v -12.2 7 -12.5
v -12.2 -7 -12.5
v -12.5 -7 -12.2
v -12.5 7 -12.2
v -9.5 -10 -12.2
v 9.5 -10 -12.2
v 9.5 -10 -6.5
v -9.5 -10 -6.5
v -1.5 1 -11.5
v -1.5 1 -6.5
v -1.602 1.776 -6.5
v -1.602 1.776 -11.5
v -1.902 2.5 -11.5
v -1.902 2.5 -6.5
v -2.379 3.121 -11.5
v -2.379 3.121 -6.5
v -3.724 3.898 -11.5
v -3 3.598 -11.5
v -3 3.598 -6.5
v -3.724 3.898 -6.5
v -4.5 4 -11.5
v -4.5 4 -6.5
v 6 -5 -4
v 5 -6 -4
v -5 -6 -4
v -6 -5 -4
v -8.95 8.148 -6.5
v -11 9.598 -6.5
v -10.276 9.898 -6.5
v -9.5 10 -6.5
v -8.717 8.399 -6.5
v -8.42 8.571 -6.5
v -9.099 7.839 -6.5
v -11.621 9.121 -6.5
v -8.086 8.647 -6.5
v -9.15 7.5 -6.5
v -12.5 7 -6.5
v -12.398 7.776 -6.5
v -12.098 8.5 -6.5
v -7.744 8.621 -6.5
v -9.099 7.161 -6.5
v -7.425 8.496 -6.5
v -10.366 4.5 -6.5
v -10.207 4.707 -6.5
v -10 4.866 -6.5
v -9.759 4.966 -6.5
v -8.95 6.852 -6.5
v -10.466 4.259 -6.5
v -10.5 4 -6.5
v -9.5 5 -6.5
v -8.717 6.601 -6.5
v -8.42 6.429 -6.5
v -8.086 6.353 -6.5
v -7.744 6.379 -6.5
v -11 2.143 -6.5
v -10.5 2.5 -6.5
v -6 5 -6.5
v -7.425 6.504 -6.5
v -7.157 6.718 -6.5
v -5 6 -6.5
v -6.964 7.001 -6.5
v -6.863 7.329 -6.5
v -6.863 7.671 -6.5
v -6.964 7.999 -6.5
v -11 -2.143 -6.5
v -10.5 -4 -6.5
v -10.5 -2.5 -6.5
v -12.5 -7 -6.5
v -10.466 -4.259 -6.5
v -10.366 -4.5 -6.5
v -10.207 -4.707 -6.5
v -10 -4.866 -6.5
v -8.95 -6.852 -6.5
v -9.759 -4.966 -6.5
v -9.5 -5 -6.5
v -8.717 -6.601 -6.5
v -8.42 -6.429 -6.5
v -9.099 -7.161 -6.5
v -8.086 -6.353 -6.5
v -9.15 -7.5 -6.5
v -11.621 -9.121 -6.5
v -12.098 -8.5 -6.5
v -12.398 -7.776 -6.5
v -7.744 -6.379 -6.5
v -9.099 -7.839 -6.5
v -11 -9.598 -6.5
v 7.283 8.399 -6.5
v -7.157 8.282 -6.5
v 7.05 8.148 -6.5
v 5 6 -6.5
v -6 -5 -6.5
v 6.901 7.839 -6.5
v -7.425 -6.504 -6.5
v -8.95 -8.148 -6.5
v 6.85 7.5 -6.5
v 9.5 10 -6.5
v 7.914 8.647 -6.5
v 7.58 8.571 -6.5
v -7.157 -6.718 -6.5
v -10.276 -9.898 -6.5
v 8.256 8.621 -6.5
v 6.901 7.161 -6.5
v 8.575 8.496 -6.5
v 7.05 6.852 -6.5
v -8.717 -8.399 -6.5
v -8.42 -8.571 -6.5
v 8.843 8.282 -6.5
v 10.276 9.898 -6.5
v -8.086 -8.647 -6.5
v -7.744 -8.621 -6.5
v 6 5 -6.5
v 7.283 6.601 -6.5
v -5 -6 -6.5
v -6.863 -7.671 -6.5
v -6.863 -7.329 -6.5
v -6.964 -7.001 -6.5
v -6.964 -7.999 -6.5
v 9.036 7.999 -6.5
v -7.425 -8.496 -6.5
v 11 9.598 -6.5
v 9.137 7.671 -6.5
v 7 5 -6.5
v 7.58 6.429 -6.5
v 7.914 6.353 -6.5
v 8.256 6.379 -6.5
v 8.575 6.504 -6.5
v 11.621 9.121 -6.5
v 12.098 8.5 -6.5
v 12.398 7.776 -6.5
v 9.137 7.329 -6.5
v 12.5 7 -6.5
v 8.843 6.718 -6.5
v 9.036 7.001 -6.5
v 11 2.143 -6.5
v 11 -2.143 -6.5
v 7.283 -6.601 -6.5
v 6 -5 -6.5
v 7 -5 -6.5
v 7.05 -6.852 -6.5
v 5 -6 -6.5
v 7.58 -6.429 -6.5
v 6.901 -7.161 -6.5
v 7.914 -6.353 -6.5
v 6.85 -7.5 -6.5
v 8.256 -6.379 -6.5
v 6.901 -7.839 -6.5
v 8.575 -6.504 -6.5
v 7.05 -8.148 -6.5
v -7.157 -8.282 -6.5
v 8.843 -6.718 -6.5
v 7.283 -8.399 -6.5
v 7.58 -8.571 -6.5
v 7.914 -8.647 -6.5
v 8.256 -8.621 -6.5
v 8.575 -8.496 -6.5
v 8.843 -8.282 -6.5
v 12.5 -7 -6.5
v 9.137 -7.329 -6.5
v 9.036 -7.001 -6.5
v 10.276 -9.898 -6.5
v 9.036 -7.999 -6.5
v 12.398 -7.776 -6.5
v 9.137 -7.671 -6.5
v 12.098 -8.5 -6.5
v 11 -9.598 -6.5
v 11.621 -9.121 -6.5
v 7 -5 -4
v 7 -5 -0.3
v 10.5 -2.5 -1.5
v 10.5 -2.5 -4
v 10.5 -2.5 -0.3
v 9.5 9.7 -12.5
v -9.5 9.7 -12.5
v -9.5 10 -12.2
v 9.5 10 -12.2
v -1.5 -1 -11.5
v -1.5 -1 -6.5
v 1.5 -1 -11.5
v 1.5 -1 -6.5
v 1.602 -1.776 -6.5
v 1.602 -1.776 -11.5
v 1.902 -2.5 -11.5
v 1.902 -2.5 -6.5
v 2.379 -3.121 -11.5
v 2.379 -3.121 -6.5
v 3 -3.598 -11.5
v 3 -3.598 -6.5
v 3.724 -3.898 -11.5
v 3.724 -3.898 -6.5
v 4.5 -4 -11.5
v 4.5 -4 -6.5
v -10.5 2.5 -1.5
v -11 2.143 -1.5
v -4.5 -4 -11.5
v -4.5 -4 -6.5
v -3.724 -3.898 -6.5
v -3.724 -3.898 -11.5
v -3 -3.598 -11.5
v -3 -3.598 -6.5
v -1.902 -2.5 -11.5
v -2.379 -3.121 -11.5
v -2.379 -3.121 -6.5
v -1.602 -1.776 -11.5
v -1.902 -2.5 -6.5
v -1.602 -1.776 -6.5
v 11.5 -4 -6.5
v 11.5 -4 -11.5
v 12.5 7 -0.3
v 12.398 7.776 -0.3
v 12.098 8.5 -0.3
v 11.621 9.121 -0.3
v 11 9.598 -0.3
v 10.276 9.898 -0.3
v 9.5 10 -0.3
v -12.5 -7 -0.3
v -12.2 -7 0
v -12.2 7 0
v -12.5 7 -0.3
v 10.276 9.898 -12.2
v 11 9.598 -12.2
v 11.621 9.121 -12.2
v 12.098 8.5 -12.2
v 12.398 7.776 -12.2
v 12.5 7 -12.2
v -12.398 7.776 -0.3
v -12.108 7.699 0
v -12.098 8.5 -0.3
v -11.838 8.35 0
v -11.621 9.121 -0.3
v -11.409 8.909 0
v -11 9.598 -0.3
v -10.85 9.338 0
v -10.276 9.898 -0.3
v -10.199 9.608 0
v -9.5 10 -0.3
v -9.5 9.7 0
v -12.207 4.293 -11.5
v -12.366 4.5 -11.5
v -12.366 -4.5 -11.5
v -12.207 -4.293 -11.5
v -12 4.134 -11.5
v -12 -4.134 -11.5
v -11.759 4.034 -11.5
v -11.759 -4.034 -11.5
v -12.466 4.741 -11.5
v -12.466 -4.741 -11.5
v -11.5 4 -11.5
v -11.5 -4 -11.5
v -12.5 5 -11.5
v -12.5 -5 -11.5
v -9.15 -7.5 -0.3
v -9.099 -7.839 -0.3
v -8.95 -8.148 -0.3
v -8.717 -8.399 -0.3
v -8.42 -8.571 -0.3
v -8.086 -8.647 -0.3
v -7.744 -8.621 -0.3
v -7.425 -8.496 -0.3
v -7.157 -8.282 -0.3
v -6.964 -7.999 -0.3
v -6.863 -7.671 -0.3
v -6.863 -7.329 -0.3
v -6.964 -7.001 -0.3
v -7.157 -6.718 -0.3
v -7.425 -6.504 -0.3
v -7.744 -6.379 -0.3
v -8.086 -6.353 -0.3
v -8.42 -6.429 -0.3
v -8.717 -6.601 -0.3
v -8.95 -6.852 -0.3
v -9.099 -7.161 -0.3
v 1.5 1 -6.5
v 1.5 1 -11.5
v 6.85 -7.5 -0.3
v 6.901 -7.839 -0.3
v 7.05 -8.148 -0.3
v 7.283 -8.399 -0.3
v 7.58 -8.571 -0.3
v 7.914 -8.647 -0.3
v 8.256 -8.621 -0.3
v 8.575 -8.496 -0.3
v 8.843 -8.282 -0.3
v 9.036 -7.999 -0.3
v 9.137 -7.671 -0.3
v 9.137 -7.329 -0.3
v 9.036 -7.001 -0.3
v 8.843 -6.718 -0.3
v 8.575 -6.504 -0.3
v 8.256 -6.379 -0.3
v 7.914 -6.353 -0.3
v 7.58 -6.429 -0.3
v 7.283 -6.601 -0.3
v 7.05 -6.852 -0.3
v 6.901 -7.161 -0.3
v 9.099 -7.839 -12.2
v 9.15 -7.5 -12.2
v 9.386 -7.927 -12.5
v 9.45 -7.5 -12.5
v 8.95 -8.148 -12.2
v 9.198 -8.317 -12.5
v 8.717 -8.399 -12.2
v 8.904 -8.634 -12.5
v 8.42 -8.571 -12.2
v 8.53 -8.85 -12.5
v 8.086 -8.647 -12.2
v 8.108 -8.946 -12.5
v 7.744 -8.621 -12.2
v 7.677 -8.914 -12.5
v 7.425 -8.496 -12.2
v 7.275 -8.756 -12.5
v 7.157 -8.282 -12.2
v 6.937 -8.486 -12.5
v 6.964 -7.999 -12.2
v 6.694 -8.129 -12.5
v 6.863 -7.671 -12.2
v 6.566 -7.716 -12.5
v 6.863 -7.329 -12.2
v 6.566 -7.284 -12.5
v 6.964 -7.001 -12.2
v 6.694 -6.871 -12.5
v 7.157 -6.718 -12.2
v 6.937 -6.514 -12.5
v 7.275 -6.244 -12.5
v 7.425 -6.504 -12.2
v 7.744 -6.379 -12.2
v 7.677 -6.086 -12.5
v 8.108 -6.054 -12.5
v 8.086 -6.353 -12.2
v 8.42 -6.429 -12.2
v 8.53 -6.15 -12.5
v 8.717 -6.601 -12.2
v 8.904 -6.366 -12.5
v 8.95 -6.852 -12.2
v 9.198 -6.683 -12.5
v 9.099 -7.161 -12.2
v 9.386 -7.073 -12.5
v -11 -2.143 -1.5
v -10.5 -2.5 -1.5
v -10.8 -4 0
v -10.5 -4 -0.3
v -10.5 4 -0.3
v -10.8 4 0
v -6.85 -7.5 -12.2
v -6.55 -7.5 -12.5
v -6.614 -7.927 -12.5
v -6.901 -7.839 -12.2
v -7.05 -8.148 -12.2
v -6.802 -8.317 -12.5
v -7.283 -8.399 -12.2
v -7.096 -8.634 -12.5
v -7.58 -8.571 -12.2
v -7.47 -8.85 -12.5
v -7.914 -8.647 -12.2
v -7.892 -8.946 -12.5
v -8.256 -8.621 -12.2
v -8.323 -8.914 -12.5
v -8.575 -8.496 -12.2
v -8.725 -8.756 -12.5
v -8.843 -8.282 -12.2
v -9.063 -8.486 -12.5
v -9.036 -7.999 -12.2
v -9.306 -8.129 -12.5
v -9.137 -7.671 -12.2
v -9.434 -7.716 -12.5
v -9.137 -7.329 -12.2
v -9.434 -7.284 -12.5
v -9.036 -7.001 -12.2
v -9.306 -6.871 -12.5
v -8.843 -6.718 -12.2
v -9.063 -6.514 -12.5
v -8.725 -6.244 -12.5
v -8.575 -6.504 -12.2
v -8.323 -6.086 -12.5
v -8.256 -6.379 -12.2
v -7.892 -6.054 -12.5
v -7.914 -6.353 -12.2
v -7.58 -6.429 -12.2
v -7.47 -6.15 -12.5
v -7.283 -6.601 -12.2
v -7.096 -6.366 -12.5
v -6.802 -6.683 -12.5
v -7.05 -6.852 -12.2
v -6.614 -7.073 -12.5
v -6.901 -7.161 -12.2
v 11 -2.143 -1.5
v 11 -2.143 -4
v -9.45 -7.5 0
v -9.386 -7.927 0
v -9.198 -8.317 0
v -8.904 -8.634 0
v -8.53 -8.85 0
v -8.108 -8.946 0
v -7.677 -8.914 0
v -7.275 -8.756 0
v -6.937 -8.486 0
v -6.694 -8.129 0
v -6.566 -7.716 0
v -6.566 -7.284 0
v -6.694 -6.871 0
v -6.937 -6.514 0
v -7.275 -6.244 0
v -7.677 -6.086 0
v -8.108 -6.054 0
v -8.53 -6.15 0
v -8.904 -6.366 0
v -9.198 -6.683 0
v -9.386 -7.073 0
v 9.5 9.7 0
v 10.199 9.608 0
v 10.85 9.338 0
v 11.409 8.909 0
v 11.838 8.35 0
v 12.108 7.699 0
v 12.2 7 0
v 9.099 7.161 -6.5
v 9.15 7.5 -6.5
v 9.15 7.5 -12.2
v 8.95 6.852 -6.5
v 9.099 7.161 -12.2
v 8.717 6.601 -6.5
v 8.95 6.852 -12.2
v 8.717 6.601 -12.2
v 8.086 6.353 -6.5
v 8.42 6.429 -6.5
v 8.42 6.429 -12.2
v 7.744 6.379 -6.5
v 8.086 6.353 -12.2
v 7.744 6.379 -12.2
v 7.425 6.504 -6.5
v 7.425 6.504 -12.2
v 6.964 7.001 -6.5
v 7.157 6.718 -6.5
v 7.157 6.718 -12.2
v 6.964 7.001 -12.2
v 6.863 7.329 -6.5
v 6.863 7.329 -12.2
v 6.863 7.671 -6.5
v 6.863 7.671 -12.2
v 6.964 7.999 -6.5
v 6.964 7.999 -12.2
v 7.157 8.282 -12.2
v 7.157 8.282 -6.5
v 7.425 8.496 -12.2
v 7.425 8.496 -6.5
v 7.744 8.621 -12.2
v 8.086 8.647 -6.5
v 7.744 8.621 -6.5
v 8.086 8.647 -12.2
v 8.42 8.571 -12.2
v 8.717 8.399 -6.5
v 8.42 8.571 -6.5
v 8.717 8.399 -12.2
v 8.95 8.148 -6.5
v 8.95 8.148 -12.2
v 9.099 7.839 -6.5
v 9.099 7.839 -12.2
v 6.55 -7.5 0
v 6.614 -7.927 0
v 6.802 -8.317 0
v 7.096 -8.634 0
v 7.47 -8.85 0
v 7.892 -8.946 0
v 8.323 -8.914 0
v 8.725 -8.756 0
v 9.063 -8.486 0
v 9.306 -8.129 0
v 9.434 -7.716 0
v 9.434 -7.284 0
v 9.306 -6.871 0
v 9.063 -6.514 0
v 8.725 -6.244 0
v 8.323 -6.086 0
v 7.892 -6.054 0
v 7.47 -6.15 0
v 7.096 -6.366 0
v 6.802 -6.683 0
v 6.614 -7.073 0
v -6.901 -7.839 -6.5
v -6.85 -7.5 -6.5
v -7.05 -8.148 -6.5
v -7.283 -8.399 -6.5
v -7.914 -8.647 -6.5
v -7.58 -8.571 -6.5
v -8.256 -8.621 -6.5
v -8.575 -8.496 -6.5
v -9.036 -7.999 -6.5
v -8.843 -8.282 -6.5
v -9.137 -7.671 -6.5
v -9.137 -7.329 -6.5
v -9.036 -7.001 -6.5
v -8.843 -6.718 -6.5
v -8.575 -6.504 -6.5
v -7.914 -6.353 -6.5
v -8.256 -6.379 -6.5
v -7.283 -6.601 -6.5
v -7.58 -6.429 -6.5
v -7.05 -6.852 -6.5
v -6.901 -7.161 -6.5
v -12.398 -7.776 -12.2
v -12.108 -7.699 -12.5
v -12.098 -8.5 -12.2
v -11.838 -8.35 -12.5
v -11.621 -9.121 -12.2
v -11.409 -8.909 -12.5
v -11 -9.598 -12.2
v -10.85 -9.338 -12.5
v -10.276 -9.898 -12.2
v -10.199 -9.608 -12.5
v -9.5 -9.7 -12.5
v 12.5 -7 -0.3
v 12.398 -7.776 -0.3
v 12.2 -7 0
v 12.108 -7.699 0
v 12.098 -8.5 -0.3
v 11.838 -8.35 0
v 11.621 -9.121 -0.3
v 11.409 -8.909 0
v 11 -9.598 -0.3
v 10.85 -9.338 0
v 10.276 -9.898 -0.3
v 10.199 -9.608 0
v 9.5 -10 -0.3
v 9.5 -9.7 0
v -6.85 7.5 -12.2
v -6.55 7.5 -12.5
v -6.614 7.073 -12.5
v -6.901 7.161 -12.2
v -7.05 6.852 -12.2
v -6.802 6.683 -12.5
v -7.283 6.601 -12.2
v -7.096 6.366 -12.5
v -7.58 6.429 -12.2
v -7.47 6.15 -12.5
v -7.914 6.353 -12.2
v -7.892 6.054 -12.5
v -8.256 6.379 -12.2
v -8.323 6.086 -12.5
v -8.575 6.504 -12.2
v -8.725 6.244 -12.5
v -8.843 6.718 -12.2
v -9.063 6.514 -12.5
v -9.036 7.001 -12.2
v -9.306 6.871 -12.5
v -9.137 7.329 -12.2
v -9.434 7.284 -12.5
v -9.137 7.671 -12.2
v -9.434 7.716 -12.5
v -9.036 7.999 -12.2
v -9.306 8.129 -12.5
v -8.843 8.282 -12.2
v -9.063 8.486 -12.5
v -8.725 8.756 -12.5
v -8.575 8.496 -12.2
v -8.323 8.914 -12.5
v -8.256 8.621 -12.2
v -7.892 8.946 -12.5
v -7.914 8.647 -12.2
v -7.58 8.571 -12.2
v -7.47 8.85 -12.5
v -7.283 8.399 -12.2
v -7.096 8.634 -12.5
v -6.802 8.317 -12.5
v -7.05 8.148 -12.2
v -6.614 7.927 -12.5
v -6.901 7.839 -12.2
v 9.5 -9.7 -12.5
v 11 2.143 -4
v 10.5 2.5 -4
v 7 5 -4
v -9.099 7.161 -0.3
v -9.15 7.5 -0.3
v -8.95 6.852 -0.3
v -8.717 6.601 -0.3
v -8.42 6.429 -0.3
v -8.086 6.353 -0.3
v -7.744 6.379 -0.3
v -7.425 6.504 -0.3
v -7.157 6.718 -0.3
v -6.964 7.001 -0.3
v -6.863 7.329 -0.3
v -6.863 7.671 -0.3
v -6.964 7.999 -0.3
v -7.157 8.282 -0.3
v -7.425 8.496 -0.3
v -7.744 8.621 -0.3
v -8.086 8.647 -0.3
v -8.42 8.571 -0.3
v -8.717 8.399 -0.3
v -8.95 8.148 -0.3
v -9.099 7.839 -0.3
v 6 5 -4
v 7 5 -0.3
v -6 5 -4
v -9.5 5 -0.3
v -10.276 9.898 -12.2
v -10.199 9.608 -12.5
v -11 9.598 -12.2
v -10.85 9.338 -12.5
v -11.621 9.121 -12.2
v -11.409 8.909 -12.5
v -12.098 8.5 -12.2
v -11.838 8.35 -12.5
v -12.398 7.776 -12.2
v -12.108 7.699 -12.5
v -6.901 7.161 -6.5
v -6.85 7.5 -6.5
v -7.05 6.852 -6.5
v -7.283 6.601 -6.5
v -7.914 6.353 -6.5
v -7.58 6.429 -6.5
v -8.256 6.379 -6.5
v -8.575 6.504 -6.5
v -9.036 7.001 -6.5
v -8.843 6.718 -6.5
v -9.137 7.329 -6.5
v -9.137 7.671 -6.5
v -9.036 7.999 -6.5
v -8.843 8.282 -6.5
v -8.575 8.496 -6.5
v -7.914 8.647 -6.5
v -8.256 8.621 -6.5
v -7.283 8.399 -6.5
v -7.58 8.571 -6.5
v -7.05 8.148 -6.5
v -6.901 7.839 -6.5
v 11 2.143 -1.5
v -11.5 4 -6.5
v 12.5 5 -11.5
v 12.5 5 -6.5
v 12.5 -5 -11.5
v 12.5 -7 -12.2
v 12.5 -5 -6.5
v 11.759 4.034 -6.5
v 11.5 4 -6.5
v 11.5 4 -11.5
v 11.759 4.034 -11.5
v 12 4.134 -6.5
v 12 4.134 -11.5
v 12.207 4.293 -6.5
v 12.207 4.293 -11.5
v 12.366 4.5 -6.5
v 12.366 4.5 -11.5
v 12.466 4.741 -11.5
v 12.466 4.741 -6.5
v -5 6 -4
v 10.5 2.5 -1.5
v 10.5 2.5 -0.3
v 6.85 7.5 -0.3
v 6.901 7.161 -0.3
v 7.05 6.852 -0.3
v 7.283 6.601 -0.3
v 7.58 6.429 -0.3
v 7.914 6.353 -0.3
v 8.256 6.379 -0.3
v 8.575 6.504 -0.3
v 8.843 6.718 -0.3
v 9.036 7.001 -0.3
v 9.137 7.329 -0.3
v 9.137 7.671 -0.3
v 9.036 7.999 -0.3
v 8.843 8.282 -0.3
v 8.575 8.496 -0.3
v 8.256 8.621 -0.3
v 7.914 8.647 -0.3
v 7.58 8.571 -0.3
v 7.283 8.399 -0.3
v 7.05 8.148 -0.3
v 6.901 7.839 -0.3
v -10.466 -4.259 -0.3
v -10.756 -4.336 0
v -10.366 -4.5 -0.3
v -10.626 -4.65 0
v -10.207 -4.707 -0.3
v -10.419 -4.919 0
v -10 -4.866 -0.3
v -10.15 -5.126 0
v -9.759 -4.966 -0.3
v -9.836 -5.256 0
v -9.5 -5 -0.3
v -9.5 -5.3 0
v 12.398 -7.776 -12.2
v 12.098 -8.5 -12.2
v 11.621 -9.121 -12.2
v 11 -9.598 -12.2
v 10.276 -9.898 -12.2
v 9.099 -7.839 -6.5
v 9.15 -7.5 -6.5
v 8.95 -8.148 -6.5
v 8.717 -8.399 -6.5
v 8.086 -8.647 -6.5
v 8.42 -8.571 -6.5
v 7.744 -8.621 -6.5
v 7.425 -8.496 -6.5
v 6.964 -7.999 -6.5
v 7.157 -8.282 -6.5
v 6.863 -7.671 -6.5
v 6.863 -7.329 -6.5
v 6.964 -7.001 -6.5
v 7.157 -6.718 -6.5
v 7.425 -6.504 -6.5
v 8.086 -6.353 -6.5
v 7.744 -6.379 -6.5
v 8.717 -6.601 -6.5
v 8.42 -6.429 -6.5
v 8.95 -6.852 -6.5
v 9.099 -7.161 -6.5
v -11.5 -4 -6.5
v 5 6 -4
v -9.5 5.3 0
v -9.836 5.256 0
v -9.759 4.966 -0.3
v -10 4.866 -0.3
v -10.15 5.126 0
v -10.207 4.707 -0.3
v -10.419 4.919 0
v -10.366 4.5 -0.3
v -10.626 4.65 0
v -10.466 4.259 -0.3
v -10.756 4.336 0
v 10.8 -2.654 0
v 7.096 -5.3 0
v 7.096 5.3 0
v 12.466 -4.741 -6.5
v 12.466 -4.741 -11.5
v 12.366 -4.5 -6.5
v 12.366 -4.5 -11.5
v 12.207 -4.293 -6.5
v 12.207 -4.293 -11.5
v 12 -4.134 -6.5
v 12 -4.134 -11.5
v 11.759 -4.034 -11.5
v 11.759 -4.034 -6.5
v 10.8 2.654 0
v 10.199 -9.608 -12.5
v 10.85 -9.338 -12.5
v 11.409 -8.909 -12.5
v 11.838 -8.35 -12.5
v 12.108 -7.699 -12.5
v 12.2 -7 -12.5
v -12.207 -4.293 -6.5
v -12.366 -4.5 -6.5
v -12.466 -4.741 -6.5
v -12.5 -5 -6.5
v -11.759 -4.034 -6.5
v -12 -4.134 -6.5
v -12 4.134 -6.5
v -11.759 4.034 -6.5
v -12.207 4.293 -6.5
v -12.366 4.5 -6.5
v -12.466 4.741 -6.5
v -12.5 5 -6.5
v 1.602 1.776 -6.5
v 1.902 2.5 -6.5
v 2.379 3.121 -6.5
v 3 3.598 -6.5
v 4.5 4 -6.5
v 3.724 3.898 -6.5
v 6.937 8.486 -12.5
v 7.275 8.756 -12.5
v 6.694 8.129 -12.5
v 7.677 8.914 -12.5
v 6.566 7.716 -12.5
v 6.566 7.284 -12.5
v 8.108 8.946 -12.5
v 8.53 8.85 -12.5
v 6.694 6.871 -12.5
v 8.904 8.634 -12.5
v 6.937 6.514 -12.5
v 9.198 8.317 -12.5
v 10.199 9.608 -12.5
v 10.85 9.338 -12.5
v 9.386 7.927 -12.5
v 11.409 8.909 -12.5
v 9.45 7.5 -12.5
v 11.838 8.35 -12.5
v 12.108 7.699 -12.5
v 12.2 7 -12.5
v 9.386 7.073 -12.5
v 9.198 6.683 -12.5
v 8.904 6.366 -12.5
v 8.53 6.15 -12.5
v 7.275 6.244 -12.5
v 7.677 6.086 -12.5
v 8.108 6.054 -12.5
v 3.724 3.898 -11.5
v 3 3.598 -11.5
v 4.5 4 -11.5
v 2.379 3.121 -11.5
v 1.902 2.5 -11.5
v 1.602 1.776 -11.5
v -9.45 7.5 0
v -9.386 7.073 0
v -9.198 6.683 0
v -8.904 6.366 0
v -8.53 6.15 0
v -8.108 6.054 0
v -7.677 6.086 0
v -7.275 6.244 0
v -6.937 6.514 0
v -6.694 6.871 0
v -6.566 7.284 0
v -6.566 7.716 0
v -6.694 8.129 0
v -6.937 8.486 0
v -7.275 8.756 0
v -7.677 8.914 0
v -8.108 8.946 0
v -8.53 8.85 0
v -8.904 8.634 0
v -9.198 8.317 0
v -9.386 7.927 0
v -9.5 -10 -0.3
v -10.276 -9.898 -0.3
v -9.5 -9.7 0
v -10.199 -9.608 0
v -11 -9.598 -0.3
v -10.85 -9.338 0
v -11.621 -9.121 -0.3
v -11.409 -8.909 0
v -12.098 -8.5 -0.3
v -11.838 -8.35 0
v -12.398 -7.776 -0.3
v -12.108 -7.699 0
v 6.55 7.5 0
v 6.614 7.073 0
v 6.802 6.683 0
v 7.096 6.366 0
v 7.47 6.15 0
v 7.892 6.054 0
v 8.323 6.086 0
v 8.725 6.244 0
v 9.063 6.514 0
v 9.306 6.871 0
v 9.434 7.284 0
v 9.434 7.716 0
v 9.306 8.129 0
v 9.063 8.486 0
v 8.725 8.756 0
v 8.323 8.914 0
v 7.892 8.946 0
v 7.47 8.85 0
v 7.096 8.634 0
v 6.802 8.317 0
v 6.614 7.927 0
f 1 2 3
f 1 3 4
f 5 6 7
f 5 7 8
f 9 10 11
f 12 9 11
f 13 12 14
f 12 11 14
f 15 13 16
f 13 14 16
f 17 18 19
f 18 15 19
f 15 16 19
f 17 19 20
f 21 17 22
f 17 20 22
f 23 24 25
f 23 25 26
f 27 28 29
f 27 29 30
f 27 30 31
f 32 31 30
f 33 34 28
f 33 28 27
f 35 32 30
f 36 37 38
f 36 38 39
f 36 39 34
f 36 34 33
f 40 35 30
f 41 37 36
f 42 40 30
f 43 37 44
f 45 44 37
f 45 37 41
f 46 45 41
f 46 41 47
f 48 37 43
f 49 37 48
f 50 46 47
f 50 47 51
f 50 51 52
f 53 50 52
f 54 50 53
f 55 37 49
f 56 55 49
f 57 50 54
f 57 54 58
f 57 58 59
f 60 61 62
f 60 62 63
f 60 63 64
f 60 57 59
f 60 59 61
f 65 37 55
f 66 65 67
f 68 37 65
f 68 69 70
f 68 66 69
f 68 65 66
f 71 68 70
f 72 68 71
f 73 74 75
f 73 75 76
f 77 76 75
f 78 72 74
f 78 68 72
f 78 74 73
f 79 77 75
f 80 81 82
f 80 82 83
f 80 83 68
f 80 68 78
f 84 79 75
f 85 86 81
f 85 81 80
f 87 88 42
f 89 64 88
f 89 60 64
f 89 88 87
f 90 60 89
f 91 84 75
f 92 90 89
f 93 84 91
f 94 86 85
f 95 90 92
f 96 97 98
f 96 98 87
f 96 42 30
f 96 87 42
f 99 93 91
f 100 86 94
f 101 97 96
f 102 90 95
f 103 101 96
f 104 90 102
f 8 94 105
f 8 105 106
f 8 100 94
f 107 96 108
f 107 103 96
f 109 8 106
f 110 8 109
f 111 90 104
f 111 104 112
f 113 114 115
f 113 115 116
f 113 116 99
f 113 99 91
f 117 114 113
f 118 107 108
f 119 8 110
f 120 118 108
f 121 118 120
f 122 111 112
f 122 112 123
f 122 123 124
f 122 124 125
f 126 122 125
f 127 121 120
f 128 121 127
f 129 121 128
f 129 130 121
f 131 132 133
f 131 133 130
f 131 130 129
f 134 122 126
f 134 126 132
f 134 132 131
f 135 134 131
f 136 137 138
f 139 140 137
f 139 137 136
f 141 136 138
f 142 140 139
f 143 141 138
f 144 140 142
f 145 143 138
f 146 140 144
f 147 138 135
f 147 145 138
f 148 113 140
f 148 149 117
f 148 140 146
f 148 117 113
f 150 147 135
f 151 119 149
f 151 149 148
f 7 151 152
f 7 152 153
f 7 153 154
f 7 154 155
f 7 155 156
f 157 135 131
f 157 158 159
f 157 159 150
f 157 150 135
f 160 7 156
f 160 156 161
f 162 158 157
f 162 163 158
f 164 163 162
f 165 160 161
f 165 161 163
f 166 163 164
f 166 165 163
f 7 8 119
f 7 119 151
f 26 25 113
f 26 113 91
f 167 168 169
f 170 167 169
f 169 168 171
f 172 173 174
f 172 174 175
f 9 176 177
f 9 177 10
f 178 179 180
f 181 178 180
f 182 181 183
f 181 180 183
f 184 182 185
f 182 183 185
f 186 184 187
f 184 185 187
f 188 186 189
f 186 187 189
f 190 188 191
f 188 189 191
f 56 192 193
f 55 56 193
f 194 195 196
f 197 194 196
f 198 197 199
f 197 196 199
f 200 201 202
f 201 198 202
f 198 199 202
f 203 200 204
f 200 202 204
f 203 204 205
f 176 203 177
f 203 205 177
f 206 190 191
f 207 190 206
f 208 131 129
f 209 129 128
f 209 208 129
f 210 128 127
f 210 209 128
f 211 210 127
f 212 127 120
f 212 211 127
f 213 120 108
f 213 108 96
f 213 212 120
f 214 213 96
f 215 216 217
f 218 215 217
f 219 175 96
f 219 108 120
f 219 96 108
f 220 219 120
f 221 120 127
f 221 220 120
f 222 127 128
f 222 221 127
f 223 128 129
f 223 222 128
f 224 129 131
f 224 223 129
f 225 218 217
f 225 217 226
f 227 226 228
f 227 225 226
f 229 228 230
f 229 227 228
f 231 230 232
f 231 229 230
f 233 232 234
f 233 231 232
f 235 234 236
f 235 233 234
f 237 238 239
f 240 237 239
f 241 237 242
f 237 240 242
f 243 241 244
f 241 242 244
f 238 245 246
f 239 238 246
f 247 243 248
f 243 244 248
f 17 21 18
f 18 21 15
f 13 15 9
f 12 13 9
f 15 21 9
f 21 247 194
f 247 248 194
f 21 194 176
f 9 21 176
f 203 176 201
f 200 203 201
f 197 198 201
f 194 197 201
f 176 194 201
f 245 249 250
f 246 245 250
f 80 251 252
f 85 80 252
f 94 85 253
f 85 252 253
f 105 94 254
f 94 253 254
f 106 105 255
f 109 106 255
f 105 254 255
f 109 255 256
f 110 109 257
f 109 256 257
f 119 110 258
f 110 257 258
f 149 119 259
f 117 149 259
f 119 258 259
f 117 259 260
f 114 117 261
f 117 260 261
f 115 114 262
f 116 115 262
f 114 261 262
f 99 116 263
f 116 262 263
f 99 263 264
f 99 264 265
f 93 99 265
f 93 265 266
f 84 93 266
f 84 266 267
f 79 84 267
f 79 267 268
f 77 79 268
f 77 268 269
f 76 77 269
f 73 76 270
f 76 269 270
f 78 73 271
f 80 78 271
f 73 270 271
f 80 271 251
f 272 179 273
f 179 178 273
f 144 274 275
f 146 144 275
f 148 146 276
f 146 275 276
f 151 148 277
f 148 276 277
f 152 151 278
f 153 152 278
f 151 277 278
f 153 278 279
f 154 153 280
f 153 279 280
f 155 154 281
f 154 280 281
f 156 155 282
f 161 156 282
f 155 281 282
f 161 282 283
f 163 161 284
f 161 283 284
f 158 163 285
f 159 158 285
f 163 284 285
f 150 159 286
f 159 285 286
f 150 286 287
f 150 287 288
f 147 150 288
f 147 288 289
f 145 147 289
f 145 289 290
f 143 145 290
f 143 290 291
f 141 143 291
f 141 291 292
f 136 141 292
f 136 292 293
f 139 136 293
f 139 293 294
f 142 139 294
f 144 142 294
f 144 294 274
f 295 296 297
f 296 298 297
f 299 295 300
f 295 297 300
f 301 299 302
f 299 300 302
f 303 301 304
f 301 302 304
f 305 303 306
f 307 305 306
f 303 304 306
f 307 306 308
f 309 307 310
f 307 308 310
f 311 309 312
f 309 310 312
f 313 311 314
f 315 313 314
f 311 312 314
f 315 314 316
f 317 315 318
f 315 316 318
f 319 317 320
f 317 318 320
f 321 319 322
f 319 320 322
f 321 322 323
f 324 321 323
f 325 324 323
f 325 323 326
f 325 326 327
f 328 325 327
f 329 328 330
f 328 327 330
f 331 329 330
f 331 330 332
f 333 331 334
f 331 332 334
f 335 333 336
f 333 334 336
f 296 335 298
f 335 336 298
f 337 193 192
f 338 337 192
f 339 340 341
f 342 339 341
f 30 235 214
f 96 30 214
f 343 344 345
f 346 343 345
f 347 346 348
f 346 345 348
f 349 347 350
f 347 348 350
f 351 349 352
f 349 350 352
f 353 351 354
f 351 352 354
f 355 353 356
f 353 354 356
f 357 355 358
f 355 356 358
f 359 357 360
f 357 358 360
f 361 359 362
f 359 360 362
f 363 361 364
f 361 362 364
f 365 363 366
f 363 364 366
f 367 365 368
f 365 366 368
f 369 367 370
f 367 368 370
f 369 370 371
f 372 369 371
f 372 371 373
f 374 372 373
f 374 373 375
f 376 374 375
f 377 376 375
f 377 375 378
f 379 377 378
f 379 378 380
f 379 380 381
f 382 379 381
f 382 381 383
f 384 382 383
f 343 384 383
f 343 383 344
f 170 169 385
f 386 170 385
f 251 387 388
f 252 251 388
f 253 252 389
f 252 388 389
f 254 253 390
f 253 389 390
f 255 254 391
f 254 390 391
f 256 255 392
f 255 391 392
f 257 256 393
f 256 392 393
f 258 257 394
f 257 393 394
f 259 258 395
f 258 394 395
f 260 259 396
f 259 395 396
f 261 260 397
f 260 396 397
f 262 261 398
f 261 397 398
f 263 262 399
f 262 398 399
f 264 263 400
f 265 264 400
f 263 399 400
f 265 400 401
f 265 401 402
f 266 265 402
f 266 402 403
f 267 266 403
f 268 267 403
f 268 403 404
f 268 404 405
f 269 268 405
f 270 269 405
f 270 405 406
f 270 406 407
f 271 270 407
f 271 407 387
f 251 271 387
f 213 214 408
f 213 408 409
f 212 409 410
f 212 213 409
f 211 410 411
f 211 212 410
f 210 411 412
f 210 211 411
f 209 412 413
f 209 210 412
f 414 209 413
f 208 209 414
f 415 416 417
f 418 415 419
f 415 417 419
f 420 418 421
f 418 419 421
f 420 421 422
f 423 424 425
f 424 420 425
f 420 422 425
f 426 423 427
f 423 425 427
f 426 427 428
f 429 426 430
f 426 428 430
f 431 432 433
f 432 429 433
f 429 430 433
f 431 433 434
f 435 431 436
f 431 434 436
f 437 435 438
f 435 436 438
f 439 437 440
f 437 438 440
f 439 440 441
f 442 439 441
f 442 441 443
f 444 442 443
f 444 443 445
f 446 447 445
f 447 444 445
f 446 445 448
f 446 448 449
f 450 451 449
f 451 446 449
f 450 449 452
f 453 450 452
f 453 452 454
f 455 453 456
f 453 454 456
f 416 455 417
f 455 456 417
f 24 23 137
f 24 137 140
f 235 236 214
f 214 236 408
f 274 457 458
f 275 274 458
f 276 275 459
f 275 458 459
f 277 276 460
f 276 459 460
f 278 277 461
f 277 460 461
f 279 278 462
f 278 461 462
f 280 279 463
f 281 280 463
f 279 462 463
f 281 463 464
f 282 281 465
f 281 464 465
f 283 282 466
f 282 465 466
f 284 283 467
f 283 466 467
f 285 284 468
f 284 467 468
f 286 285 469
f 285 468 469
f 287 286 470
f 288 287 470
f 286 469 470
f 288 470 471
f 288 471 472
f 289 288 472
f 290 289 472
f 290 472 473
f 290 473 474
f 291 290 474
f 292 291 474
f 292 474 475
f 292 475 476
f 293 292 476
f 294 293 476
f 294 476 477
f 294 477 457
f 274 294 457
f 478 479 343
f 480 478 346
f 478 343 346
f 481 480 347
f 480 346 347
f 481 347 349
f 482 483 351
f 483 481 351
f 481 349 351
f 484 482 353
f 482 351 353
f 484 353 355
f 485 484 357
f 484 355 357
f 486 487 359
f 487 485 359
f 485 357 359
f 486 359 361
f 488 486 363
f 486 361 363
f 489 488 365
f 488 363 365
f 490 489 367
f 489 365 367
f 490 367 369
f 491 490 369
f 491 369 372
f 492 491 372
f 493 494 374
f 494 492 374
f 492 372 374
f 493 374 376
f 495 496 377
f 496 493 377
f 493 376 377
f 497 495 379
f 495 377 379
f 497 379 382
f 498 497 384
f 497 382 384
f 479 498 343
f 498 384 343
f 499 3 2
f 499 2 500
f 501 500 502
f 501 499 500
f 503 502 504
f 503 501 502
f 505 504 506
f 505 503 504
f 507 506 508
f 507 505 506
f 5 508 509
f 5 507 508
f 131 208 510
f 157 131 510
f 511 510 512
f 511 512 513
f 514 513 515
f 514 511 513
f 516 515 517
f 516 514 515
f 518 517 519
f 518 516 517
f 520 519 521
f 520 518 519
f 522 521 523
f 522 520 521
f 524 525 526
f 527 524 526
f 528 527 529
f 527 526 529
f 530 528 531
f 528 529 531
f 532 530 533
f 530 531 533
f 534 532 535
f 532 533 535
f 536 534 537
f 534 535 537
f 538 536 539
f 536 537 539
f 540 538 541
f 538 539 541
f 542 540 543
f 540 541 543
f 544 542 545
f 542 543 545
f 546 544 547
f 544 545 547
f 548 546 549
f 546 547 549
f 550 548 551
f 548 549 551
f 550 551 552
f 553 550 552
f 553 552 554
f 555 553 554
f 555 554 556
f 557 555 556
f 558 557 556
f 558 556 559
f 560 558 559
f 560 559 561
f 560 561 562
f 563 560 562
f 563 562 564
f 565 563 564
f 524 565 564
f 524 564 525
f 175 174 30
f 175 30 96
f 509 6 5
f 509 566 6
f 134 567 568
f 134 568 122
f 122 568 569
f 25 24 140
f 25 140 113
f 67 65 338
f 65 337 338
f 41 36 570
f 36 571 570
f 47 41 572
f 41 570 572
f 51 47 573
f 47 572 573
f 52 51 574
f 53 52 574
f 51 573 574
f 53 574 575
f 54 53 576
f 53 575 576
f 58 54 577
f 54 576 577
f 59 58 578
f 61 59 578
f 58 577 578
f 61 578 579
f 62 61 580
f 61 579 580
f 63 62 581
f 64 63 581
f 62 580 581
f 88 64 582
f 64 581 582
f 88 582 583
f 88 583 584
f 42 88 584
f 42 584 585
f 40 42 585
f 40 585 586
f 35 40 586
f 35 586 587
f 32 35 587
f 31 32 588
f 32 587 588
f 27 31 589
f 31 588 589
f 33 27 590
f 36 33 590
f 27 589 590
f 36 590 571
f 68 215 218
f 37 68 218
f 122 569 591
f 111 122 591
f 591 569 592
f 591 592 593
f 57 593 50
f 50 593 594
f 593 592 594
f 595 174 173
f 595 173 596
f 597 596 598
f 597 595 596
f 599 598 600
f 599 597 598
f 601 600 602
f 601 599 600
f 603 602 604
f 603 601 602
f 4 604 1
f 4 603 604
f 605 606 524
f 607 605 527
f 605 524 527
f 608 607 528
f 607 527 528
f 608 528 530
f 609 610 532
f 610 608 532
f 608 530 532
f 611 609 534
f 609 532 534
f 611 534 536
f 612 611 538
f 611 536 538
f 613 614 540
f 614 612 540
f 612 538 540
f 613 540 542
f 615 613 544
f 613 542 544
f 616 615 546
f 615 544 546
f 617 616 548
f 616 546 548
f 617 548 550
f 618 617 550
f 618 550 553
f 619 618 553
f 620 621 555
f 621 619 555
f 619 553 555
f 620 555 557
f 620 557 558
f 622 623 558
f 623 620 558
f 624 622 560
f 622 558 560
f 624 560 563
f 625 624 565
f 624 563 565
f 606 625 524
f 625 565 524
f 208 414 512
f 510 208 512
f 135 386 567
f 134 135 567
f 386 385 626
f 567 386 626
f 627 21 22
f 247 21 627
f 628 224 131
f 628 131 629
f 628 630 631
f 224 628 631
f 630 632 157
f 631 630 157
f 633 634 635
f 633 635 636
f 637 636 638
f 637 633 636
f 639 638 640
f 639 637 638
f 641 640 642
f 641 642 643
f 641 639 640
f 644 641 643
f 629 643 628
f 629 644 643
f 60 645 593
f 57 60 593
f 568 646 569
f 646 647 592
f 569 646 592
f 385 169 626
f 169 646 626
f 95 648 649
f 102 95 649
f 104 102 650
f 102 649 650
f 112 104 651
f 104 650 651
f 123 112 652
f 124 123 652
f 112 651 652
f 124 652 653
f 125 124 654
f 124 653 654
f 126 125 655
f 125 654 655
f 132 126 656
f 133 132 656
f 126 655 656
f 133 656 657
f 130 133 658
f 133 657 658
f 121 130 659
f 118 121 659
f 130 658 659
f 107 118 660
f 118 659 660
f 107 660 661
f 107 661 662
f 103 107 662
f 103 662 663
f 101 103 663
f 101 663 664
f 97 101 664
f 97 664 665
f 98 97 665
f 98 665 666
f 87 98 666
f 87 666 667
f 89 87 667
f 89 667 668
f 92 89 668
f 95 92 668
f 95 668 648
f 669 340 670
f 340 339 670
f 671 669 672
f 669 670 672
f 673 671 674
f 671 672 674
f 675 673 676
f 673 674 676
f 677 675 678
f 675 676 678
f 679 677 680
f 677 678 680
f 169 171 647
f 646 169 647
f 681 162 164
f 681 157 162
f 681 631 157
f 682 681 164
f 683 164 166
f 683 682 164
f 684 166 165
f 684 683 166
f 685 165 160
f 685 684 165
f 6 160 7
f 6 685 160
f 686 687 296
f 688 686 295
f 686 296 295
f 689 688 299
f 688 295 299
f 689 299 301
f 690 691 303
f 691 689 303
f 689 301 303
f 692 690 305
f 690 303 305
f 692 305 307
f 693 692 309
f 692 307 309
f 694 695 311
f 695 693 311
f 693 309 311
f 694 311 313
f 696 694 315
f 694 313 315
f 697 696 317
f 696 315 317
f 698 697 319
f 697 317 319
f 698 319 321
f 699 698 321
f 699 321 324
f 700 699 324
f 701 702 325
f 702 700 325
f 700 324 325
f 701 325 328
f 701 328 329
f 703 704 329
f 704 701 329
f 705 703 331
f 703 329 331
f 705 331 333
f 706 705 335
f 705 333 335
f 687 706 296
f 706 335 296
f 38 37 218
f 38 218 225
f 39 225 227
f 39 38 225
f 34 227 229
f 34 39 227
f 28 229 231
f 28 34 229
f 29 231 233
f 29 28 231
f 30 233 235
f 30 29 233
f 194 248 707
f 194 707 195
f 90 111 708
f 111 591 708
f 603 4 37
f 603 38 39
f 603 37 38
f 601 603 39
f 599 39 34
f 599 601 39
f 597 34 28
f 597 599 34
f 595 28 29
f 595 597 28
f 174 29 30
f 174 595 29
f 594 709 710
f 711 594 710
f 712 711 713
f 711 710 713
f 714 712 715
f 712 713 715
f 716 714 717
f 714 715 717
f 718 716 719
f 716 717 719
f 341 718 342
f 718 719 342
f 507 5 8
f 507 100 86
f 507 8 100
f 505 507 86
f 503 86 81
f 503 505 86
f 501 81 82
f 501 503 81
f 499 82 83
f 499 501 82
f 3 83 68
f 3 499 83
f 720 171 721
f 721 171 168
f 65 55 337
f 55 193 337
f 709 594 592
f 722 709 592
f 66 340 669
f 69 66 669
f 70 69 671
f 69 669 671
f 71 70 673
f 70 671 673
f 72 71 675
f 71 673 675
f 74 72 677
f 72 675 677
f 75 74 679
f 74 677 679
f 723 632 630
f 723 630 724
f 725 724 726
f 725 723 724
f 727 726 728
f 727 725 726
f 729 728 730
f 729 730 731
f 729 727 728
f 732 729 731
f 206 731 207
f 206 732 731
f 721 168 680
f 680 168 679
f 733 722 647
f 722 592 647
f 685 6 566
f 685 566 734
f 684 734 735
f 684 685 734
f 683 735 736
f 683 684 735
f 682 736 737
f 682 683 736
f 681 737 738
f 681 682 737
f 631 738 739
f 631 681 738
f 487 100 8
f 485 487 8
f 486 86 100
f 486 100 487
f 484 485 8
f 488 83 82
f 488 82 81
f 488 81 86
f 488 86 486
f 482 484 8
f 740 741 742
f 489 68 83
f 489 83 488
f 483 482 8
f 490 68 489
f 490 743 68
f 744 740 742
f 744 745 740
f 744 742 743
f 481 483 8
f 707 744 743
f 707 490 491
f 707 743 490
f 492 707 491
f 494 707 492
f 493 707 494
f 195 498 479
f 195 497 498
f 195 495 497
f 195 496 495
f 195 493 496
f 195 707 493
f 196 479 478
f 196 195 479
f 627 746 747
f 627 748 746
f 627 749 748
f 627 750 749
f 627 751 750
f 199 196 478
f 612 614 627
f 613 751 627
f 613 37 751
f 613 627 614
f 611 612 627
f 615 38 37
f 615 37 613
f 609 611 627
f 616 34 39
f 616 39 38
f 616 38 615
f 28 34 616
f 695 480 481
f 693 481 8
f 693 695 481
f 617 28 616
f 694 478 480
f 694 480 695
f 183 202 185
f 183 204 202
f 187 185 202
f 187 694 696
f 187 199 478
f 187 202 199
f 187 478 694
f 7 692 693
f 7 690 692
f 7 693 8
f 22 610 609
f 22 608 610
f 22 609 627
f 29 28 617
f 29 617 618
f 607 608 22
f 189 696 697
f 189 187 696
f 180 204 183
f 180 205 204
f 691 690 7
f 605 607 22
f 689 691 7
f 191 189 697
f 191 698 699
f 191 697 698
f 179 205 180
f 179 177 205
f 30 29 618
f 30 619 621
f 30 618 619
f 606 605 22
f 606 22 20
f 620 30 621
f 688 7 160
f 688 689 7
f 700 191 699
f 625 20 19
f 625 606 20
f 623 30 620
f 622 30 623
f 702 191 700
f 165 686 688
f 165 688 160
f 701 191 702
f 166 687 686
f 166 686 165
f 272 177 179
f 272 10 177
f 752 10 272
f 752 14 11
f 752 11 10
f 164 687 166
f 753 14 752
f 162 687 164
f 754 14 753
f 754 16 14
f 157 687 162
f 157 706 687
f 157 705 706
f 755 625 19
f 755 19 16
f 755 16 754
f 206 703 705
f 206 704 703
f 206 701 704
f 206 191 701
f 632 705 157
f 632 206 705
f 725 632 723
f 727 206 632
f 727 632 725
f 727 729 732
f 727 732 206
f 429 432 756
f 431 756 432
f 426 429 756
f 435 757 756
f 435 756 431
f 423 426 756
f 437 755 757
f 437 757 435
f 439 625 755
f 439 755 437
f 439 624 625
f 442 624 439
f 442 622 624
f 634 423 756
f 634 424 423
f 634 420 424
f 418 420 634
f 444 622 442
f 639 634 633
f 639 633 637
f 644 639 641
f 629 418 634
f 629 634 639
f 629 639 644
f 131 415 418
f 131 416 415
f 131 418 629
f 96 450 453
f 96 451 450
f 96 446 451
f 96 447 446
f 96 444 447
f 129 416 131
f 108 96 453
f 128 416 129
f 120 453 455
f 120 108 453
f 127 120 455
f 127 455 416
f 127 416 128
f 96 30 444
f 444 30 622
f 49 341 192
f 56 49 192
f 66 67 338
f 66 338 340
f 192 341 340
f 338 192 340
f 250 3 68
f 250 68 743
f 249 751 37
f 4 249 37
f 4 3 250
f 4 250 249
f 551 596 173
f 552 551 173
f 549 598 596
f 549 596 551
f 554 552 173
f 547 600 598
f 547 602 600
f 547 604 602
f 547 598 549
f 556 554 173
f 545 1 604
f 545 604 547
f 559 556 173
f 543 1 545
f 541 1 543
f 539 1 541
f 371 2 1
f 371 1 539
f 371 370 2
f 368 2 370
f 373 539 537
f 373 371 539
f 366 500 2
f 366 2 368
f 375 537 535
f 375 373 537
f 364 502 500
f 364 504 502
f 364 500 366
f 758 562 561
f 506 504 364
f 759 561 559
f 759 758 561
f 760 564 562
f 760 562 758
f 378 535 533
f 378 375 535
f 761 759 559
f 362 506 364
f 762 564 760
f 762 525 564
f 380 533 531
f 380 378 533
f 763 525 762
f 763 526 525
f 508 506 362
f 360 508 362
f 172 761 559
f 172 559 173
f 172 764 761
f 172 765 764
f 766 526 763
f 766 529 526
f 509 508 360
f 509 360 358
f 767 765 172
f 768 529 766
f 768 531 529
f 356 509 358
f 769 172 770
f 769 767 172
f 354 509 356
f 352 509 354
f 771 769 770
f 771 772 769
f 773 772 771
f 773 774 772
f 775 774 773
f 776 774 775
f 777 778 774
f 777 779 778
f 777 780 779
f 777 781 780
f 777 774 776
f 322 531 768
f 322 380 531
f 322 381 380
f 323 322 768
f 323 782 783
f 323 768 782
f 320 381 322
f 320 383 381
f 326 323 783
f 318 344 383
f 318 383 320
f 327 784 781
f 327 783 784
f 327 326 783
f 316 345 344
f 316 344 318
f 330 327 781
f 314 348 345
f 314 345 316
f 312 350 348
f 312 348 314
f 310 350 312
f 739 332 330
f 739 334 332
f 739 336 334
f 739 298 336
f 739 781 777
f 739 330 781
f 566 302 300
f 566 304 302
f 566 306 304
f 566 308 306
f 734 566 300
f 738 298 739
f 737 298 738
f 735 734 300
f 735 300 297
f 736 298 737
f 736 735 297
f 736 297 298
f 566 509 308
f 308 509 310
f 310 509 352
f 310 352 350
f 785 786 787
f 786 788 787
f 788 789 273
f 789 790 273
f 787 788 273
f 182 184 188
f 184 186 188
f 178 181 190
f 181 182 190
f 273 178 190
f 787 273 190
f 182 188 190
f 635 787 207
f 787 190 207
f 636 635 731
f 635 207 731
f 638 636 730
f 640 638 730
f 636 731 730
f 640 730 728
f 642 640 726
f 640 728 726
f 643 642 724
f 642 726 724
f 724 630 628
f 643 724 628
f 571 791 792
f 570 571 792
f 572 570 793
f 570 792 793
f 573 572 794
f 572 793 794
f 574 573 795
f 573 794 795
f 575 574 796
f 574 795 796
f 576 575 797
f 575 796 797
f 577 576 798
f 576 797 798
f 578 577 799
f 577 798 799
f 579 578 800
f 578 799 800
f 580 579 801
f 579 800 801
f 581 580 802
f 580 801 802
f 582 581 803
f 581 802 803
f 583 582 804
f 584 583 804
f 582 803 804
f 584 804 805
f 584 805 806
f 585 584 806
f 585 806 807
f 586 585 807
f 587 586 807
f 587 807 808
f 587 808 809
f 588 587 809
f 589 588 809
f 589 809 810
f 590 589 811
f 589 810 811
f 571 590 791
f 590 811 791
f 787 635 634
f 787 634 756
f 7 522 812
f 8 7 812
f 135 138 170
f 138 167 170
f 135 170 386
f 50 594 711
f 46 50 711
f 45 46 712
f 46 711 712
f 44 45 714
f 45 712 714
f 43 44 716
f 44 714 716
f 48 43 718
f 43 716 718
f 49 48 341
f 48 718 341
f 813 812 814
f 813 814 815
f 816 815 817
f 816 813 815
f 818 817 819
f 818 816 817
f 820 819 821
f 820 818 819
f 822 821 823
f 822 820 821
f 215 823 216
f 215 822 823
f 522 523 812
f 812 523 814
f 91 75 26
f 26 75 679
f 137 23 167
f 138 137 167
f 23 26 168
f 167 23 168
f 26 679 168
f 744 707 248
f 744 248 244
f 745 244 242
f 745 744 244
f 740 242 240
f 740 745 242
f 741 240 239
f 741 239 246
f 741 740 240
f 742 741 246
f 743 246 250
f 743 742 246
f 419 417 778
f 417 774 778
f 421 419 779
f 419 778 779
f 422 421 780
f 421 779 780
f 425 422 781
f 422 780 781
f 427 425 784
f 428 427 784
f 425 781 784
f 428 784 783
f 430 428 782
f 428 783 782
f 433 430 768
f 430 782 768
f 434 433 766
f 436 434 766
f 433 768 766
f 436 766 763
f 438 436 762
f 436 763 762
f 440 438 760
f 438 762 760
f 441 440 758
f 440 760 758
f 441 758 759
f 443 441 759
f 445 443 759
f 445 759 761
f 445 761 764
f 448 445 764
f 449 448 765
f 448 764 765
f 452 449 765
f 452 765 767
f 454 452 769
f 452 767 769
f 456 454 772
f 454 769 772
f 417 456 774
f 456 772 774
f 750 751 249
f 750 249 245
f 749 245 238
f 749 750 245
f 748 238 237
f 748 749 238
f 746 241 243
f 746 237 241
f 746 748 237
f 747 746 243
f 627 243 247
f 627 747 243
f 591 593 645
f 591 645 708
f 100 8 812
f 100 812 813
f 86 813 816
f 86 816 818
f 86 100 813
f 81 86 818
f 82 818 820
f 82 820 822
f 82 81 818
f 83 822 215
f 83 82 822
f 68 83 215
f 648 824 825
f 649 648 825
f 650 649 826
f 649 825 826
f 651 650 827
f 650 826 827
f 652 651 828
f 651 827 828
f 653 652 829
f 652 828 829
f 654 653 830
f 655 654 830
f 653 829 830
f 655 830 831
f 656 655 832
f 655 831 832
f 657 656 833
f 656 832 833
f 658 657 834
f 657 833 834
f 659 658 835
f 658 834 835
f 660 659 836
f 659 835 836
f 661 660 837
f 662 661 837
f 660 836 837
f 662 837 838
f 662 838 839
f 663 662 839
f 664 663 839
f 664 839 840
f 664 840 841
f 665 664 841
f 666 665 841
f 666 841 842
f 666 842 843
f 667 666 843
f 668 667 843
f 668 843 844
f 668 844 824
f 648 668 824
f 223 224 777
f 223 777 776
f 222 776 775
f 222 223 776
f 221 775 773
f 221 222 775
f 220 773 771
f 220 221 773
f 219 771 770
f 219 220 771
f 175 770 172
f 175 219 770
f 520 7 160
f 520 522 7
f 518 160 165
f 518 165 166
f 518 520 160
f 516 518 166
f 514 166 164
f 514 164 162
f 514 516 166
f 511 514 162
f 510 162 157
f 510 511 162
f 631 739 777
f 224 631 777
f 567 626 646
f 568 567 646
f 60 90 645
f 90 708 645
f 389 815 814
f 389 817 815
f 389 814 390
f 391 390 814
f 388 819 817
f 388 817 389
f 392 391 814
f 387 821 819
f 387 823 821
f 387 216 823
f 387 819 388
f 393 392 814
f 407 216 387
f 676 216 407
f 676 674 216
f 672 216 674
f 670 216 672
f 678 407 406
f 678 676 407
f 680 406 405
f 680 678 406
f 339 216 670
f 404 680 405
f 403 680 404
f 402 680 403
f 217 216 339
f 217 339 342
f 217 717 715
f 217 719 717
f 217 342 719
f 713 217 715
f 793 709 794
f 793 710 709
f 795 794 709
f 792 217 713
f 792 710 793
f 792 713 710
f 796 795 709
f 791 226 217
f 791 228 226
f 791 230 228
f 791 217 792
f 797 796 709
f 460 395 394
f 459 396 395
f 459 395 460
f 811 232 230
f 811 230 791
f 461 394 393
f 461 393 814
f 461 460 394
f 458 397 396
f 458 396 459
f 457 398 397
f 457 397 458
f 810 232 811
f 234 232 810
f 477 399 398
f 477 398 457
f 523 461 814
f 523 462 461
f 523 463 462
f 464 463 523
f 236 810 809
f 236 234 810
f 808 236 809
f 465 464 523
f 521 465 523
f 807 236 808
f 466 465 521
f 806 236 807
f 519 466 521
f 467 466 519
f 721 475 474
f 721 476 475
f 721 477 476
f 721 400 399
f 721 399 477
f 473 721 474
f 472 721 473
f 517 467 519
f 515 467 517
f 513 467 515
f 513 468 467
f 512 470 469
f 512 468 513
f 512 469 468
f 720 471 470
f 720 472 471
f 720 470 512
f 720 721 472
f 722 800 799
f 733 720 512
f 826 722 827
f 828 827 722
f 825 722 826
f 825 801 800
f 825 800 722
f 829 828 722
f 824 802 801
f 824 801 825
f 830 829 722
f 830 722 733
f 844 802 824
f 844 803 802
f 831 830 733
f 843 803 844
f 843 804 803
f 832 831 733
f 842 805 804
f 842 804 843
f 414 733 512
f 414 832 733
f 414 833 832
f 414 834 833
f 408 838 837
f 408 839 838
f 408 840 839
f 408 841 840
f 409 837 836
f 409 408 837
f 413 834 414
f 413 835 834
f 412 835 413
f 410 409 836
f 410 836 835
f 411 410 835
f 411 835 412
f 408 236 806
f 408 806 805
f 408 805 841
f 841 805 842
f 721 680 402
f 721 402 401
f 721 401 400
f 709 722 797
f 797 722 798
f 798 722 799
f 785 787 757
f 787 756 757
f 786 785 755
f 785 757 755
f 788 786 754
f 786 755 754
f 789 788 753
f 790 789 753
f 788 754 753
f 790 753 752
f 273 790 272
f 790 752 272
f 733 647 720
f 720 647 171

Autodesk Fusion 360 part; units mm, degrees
sketch "Sketch1" plane through (0, 0, 0) normal (0, 0, 1) x (1, 0, 0) in component "Top"
  line L0 (12.5, -10) -> (-12.5, -10)
  line L1 (-12.5, -10) -> (-12.5, 10)
  line L2 (-12.5, 10) -> (12.5, 10)
  line L3 (12.5, 10) -> (12.5, -10)
  line L4 (12.5, -10) -> (-12.5, 10) construction
  line L5 (-12.5, -10) -> (12.5, 10) construction
  line L6 (-10.5, 5) -> (-10.5, -5)
  line L7 (-10.5, -5) -> (7, -5)
  line L8 (7, -5) -> (10.5, -2.5)
  line L9 (10.5, -2.5) -> (10.5, 2.5)
  line L10 (10.5, 2.5) -> (7, 5)
  line L11 (7, 5) -> (-10.5, 5)
  line L12 (0, 0) -> (-22, 0) construction
  line L13 (0, 0) -> (0, 9) construction
  dimension "d1" = 25
  dimension "d2" = 20
  dimension "d3" = 10
  dimension "d4" = 21
  dimension "d5" = 2.5
  dimension "d6" = 3.5
extrude "Extrude1" add sketch "Sketch1" against normal blind 1.5 makes body 1 in component "Top"
fillet "Fillet1" radius 1 2 edges at (-10.5, 5, -0.75) (-10.5, -5, -0.75) on bodies 1 in component "Top"
sketch "Sketch2" plane through (0, 0, -1.5) normal (0, 0, -1) x (1, 0, 0) in component "Top"
  line L0 (7, -5) -> (-9.5, -5)
  arc A0 (-10.5, -4) -> (-9.5, -5) centre (-9.5, -4) ccw
  line L1 (-10.5, -4) -> (-10.5, 4)
  arc A1 (-9.5, 5) -> (-10.5, 4) centre (-9.5, 4) ccw
  line L2 (-9.5, 5) -> (7, 5)
  line L3 (7, 5) -> (10.5, 2.5)
  line L4 (10.5, 2.5) -> (10.5, -2.5)
  line L5 (10.5, -2.5) -> (7, -5)
  line L6 (-12.5, -10) -> (12.5, -10)
  line L7 (12.5, -10) -> (12.5, 10)
  line L8 (12.5, 10) -> (-12.5, 10)
  line L9 (-12.5, 10) -> (-12.5, -10)
  line L10 (10.5, 2.5) -> (11, 2.1429)
  line L11 (11, 2.1429) -> (11, -2.1429)
  line L12 (11, -2.1429) -> (10.5, -2.5)
  line L13 (0, 0) -> (0, 13.3423) construction
  line L14 (-10.5, 2.5) -> (-11, 2.1429)
  line L15 (-11, 2.1429) -> (-11, -2.1429)
  line L16 (-11, -2.1429) -> (-10.5, -2.5)
  dimension "d11" = 0.5
extrude "Extrude2" add sketch "Sketch2" along normal blind 2.5 bodies 1 in component "Top"
sketch "Sketch3" plane through (0, 0, -4) normal (0, 0, -1) x (1, 0, 0) in component "Top"
  line L0 (-11, 2.1429) -> (-10.5, 2.5)
  line L1 (-10.5, 2.5) -> (-10.5, 4)
  arc A0 (-9.5, 5) -> (-10.5, 4) centre (-9.5, 4) ccw
  line L2 (-9.5, 5) -> (7, 5)
  line L3 (7, 5) -> (11, 2.1429)
  line L4 (11, 2.1429) -> (11, -2.1429)
  line L5 (11, -2.1429) -> (7, -5)
  line L6 (7, -5) -> (-9.5, -5)
  arc A1 (-10.5, -4) -> (-9.5, -5) centre (-9.5, -4) ccw
  line L7 (-10.5, -4) -> (-10.5, -2.5)
  line L8 (-10.5, -2.5) -> (-11, -2.1429)
  line L9 (-11, -2.1429) -> (-11, 2.1429)
  line L10 (-12.5, 10) -> (-12.5, -10)
  line L11 (-12.5, -10) -> (12.5, -10)
  line L12 (12.5, -10) -> (12.5, 10)
  line L13 (12.5, 10) -> (-12.5, 10)
  line L14 (0, 0) -> (13.5, 0) construction
  line L15 (6, 5) -> (5, 6)
  line L16 (5, 6) -> (-5, 6)
  line L17 (-5, 6) -> (-6, 5)
  line L18 (0, 0) -> (0, 13.6584) construction
  line L19 (6, -5) -> (5, -6)
  line L20 (5, -6) -> (-5, -6)
  line L21 (-5, -6) -> (-6, -5)
  dimension "d17" = 1
  dimension "d18" = 135
  dimension "d19" = 10
extrude "Extrude3" add sketch "Sketch3" along normal blind 2.5 bodies 1 in component "Top"
sketch "Sketch4" plane through (0, 0, 0) normal (0, 0, 1) x (-1, 0, 0) in component "Top"
  line L0 (9.5, -5) -> (-7, -5)
  line L1 (-7, -5) -> (-10.5, -2.5)
  line L2 (-10.5, -2.5) -> (-10.5, 2.5)
  line L3 (-10.5, 2.5) -> (-7, 5)
  line L4 (-7, 5) -> (9.5, 5)
  arc A0 (10.5, 4) -> (9.5, 5) centre (9.5, 4) ccw
  line L5 (10.5, 4) -> (10.5, -4)
  arc A1 (9.5, -5) -> (10.5, -4) centre (9.5, -4) ccw
  line L6 (-12.5, -10) -> (12.5, -10)
  line L7 (12.5, -10) -> (12.5, 10)
  line L8 (12.5, 10) -> (-12.5, 10)
  line L9 (-12.5, 10) -> (-12.5, -10)
  circle A2 centre (8, -7.5) radius 1.15
  line L10 (0, 0) -> (0, -18) construction
  circle A3 centre (-8, -7.5) radius 1.15
  line L11 (0, 0) -> (-17, 0) construction
  circle A4 centre (-8, 7.5) radius 1.15
  circle A5 centre (8, 7.5) radius 1.15
  dimension "d20" = 2.3
  dimension "d21" = 16
  dimension "d22" = 15
extrude "Extrude4" cut sketch "Sketch4" against normal up to surface (6.5 mm away) contours A2 | A3 | A4 | A5 bodies 1 in component "Top"
fillet "Fillet2" radius 3 4 edges at (-12.5, -10, -3.25) (12.5, -10, -3.25) (12.5, 10, -3.25) (-12.5, 10, -3.25) on bodies 1 in component "Top"
chamfer "Chamfer1" distance 0.3 angle 45 1 faces at (10.6143, -5.4059, 0) on bodies 1 in component "Top"
sketch "Sketch1 (2)" plane through (0, 0, 0) normal (0, 0, 1) x (1, 0, 0) in component "Bottom"
  arc A0 (12.5, 7) -> (9.5, 10) centre (9.5, 7) ccw
  arc A1 (12.5, 7) -> (9.5, 10) centre (9.5, 7) ccw
  line L0 (-9.5, 10) -> (9.5, 10)
  line L1 (9.5, 10) -> (-9.5, 10)
  arc A2 (-9.5, 10) -> (-12.5, 7) centre (-9.5, 7) ccw
  arc A3 (-9.5, 10) -> (-12.5, 7) centre (-9.5, 7) ccw
  line L2 (-12.5, -7) -> (-12.5, 7)
  line L3 (-12.5, 7) -> (-12.5, -7)
  arc A4 (-12.5, -7) -> (-9.5, -10) centre (-9.5, -7) ccw
  arc A5 (-12.5, -7) -> (-9.5, -10) centre (-9.5, -7) ccw
  line L4 (9.5, -10) -> (-9.5, -10)
  line L5 (-9.5, -10) -> (9.5, -10)
  arc A6 (9.5, -10) -> (12.5, -7) centre (9.5, -7) ccw
  arc A7 (9.5, -10) -> (12.5, -7) centre (9.5, -7) ccw
  line L6 (12.5, 7) -> (12.5, -7)
  line L7 (12.5, -7) -> (12.5, 7)
  circle A8 centre (8, 7.5) radius 1.15
  circle A9 centre (8, 7.5) radius 1.15
  circle A10 centre (8, -7.5) radius 1.15
  circle A11 centre (8, -7.5) radius 1.15
  circle A12 centre (-8, -7.5) radius 1.15
  circle A13 centre (-8, -7.5) radius 1.15
  circle A14 centre (-8, 7.5) radius 1.15
  circle A15 centre (-8, 7.5) radius 1.15
  line L8 (-12.5, -4) -> (12.5, -4)
  line L9 (12.5, 4) -> (-12.5, 4)
  line L10 (-1.5, -4) -> (-1.5, 4)
  line L11 (1.5, -4) -> (1.5, 4)
  line L12 (0, 0) -> (0, -8) construction
  line L13 (0, 0) -> (14, 0) construction
  dimension "d28" = 8
  dimension "d29" = 3
extrude "Extrude1'" add sketch "Sketch1 (2)" along normal blind 5 separate body contours A0 A1 L0 L1 A2 A3 L2 L3 L6 L7 L9 | L2 L3 A4 A5 L4 L5 A6 A7 L6 L7 L8 | L8 L9 L10 L11 makes body 2 in component "Bottom"
fillet "Fillet1'" radius 3 4 edges at (-1.5, -4, 2.5) (-1.5, 4, 2.5) (1.5, -4, 2.5) (1.5, 4, 2.5) on bodies 2 in component "Bottom"
fillet "Fillet2'" radius 1 4 edges at (-12.5, -4, 2.5) (-12.5, 4, 2.5) (12.5, -4, 2.5) (12.5, 4, 2.5) on bodies 2 in component "Bottom"
sketch "Sketch2 (2)" plane through (0, 0, 0) normal (0, 0, -1) x (1, 0, 0) in component "Bottom"
  arc A0 (12.5, -5) -> (11.5, -4) centre (11.5, -5) ccw
  line L0 (11.5, -4) -> (4.5, -4)
  arc A1 (1.5, -1) -> (4.5, -4) centre (4.5, -1) ccw
  line L1 (1.5, -1) -> (1.5, 1)
  arc A2 (4.5, 4) -> (1.5, 1) centre (4.5, 1) ccw
  line L2 (4.5, 4) -> (11.5, 4)
  arc A3 (11.5, 4) -> (12.5, 5) centre (11.5, 5) ccw
  line L3 (12.5, 5) -> (12.5, 7)
  arc A4 (12.5, 7) -> (9.5, 10) centre (9.5, 7) ccw
  line L4 (9.5, 10) -> (-9.5, 10)
  arc A5 (-9.5, 10) -> (-12.5, 7) centre (-9.5, 7) ccw
  line L5 (-12.5, 7) -> (-12.5, 5)
  arc A6 (-12.5, 5) -> (-11.5, 4) centre (-11.5, 5) ccw
  line L6 (-11.5, 4) -> (-4.5, 4)
  arc A7 (-1.5, 1) -> (-4.5, 4) centre (-4.5, 1) ccw
  line L7 (-1.5, 1) -> (-1.5, -1)
  arc A8 (-4.5, -4) -> (-1.5, -1) centre (-4.5, -1) ccw
  line L8 (-4.5, -4) -> (-11.5, -4)
  arc A9 (-11.5, -4) -> (-12.5, -5) centre (-11.5, -5) ccw
  line L9 (-12.5, -5) -> (-12.5, -7)
  arc A10 (-12.5, -7) -> (-9.5, -10) centre (-9.5, -7) ccw
  line L10 (-9.5, -10) -> (9.5, -10)
  arc A11 (9.5, -10) -> (12.5, -7) centre (9.5, -7) ccw
  line L11 (12.5, -7) -> (12.5, -5)
  circle A12 centre (8, 7.5) radius 1.15
  circle A13 centre (8, -7.5) radius 1.15
  circle A14 centre (-8, 7.5) radius 1.15
  circle A15 centre (-8, -7.5) radius 1.15
  line L12 (-12.5, -5) -> (-12.5, 5)
  line L13 (12.5, -5) -> (12.5, 5)
extrude "Extrude2'" add sketch "Sketch2 (2)" along normal blind 1 bodies 2 in component "Bottom"
chamfer "Chamfer1'" distance 0.3 angle 45 1 faces at (-2.3857, 2.2393, -1) on bodies 2 in component "Bottom"
component "Top" placed x (1, 0, 0) y (0, 1, 0) z (0, 0, 1) at (0, 0, 0)
component "Bottom" placed x (1, 0, 0) y (0, 1, 0) z (0, 0, 1) at (0, 0, -11.5)
